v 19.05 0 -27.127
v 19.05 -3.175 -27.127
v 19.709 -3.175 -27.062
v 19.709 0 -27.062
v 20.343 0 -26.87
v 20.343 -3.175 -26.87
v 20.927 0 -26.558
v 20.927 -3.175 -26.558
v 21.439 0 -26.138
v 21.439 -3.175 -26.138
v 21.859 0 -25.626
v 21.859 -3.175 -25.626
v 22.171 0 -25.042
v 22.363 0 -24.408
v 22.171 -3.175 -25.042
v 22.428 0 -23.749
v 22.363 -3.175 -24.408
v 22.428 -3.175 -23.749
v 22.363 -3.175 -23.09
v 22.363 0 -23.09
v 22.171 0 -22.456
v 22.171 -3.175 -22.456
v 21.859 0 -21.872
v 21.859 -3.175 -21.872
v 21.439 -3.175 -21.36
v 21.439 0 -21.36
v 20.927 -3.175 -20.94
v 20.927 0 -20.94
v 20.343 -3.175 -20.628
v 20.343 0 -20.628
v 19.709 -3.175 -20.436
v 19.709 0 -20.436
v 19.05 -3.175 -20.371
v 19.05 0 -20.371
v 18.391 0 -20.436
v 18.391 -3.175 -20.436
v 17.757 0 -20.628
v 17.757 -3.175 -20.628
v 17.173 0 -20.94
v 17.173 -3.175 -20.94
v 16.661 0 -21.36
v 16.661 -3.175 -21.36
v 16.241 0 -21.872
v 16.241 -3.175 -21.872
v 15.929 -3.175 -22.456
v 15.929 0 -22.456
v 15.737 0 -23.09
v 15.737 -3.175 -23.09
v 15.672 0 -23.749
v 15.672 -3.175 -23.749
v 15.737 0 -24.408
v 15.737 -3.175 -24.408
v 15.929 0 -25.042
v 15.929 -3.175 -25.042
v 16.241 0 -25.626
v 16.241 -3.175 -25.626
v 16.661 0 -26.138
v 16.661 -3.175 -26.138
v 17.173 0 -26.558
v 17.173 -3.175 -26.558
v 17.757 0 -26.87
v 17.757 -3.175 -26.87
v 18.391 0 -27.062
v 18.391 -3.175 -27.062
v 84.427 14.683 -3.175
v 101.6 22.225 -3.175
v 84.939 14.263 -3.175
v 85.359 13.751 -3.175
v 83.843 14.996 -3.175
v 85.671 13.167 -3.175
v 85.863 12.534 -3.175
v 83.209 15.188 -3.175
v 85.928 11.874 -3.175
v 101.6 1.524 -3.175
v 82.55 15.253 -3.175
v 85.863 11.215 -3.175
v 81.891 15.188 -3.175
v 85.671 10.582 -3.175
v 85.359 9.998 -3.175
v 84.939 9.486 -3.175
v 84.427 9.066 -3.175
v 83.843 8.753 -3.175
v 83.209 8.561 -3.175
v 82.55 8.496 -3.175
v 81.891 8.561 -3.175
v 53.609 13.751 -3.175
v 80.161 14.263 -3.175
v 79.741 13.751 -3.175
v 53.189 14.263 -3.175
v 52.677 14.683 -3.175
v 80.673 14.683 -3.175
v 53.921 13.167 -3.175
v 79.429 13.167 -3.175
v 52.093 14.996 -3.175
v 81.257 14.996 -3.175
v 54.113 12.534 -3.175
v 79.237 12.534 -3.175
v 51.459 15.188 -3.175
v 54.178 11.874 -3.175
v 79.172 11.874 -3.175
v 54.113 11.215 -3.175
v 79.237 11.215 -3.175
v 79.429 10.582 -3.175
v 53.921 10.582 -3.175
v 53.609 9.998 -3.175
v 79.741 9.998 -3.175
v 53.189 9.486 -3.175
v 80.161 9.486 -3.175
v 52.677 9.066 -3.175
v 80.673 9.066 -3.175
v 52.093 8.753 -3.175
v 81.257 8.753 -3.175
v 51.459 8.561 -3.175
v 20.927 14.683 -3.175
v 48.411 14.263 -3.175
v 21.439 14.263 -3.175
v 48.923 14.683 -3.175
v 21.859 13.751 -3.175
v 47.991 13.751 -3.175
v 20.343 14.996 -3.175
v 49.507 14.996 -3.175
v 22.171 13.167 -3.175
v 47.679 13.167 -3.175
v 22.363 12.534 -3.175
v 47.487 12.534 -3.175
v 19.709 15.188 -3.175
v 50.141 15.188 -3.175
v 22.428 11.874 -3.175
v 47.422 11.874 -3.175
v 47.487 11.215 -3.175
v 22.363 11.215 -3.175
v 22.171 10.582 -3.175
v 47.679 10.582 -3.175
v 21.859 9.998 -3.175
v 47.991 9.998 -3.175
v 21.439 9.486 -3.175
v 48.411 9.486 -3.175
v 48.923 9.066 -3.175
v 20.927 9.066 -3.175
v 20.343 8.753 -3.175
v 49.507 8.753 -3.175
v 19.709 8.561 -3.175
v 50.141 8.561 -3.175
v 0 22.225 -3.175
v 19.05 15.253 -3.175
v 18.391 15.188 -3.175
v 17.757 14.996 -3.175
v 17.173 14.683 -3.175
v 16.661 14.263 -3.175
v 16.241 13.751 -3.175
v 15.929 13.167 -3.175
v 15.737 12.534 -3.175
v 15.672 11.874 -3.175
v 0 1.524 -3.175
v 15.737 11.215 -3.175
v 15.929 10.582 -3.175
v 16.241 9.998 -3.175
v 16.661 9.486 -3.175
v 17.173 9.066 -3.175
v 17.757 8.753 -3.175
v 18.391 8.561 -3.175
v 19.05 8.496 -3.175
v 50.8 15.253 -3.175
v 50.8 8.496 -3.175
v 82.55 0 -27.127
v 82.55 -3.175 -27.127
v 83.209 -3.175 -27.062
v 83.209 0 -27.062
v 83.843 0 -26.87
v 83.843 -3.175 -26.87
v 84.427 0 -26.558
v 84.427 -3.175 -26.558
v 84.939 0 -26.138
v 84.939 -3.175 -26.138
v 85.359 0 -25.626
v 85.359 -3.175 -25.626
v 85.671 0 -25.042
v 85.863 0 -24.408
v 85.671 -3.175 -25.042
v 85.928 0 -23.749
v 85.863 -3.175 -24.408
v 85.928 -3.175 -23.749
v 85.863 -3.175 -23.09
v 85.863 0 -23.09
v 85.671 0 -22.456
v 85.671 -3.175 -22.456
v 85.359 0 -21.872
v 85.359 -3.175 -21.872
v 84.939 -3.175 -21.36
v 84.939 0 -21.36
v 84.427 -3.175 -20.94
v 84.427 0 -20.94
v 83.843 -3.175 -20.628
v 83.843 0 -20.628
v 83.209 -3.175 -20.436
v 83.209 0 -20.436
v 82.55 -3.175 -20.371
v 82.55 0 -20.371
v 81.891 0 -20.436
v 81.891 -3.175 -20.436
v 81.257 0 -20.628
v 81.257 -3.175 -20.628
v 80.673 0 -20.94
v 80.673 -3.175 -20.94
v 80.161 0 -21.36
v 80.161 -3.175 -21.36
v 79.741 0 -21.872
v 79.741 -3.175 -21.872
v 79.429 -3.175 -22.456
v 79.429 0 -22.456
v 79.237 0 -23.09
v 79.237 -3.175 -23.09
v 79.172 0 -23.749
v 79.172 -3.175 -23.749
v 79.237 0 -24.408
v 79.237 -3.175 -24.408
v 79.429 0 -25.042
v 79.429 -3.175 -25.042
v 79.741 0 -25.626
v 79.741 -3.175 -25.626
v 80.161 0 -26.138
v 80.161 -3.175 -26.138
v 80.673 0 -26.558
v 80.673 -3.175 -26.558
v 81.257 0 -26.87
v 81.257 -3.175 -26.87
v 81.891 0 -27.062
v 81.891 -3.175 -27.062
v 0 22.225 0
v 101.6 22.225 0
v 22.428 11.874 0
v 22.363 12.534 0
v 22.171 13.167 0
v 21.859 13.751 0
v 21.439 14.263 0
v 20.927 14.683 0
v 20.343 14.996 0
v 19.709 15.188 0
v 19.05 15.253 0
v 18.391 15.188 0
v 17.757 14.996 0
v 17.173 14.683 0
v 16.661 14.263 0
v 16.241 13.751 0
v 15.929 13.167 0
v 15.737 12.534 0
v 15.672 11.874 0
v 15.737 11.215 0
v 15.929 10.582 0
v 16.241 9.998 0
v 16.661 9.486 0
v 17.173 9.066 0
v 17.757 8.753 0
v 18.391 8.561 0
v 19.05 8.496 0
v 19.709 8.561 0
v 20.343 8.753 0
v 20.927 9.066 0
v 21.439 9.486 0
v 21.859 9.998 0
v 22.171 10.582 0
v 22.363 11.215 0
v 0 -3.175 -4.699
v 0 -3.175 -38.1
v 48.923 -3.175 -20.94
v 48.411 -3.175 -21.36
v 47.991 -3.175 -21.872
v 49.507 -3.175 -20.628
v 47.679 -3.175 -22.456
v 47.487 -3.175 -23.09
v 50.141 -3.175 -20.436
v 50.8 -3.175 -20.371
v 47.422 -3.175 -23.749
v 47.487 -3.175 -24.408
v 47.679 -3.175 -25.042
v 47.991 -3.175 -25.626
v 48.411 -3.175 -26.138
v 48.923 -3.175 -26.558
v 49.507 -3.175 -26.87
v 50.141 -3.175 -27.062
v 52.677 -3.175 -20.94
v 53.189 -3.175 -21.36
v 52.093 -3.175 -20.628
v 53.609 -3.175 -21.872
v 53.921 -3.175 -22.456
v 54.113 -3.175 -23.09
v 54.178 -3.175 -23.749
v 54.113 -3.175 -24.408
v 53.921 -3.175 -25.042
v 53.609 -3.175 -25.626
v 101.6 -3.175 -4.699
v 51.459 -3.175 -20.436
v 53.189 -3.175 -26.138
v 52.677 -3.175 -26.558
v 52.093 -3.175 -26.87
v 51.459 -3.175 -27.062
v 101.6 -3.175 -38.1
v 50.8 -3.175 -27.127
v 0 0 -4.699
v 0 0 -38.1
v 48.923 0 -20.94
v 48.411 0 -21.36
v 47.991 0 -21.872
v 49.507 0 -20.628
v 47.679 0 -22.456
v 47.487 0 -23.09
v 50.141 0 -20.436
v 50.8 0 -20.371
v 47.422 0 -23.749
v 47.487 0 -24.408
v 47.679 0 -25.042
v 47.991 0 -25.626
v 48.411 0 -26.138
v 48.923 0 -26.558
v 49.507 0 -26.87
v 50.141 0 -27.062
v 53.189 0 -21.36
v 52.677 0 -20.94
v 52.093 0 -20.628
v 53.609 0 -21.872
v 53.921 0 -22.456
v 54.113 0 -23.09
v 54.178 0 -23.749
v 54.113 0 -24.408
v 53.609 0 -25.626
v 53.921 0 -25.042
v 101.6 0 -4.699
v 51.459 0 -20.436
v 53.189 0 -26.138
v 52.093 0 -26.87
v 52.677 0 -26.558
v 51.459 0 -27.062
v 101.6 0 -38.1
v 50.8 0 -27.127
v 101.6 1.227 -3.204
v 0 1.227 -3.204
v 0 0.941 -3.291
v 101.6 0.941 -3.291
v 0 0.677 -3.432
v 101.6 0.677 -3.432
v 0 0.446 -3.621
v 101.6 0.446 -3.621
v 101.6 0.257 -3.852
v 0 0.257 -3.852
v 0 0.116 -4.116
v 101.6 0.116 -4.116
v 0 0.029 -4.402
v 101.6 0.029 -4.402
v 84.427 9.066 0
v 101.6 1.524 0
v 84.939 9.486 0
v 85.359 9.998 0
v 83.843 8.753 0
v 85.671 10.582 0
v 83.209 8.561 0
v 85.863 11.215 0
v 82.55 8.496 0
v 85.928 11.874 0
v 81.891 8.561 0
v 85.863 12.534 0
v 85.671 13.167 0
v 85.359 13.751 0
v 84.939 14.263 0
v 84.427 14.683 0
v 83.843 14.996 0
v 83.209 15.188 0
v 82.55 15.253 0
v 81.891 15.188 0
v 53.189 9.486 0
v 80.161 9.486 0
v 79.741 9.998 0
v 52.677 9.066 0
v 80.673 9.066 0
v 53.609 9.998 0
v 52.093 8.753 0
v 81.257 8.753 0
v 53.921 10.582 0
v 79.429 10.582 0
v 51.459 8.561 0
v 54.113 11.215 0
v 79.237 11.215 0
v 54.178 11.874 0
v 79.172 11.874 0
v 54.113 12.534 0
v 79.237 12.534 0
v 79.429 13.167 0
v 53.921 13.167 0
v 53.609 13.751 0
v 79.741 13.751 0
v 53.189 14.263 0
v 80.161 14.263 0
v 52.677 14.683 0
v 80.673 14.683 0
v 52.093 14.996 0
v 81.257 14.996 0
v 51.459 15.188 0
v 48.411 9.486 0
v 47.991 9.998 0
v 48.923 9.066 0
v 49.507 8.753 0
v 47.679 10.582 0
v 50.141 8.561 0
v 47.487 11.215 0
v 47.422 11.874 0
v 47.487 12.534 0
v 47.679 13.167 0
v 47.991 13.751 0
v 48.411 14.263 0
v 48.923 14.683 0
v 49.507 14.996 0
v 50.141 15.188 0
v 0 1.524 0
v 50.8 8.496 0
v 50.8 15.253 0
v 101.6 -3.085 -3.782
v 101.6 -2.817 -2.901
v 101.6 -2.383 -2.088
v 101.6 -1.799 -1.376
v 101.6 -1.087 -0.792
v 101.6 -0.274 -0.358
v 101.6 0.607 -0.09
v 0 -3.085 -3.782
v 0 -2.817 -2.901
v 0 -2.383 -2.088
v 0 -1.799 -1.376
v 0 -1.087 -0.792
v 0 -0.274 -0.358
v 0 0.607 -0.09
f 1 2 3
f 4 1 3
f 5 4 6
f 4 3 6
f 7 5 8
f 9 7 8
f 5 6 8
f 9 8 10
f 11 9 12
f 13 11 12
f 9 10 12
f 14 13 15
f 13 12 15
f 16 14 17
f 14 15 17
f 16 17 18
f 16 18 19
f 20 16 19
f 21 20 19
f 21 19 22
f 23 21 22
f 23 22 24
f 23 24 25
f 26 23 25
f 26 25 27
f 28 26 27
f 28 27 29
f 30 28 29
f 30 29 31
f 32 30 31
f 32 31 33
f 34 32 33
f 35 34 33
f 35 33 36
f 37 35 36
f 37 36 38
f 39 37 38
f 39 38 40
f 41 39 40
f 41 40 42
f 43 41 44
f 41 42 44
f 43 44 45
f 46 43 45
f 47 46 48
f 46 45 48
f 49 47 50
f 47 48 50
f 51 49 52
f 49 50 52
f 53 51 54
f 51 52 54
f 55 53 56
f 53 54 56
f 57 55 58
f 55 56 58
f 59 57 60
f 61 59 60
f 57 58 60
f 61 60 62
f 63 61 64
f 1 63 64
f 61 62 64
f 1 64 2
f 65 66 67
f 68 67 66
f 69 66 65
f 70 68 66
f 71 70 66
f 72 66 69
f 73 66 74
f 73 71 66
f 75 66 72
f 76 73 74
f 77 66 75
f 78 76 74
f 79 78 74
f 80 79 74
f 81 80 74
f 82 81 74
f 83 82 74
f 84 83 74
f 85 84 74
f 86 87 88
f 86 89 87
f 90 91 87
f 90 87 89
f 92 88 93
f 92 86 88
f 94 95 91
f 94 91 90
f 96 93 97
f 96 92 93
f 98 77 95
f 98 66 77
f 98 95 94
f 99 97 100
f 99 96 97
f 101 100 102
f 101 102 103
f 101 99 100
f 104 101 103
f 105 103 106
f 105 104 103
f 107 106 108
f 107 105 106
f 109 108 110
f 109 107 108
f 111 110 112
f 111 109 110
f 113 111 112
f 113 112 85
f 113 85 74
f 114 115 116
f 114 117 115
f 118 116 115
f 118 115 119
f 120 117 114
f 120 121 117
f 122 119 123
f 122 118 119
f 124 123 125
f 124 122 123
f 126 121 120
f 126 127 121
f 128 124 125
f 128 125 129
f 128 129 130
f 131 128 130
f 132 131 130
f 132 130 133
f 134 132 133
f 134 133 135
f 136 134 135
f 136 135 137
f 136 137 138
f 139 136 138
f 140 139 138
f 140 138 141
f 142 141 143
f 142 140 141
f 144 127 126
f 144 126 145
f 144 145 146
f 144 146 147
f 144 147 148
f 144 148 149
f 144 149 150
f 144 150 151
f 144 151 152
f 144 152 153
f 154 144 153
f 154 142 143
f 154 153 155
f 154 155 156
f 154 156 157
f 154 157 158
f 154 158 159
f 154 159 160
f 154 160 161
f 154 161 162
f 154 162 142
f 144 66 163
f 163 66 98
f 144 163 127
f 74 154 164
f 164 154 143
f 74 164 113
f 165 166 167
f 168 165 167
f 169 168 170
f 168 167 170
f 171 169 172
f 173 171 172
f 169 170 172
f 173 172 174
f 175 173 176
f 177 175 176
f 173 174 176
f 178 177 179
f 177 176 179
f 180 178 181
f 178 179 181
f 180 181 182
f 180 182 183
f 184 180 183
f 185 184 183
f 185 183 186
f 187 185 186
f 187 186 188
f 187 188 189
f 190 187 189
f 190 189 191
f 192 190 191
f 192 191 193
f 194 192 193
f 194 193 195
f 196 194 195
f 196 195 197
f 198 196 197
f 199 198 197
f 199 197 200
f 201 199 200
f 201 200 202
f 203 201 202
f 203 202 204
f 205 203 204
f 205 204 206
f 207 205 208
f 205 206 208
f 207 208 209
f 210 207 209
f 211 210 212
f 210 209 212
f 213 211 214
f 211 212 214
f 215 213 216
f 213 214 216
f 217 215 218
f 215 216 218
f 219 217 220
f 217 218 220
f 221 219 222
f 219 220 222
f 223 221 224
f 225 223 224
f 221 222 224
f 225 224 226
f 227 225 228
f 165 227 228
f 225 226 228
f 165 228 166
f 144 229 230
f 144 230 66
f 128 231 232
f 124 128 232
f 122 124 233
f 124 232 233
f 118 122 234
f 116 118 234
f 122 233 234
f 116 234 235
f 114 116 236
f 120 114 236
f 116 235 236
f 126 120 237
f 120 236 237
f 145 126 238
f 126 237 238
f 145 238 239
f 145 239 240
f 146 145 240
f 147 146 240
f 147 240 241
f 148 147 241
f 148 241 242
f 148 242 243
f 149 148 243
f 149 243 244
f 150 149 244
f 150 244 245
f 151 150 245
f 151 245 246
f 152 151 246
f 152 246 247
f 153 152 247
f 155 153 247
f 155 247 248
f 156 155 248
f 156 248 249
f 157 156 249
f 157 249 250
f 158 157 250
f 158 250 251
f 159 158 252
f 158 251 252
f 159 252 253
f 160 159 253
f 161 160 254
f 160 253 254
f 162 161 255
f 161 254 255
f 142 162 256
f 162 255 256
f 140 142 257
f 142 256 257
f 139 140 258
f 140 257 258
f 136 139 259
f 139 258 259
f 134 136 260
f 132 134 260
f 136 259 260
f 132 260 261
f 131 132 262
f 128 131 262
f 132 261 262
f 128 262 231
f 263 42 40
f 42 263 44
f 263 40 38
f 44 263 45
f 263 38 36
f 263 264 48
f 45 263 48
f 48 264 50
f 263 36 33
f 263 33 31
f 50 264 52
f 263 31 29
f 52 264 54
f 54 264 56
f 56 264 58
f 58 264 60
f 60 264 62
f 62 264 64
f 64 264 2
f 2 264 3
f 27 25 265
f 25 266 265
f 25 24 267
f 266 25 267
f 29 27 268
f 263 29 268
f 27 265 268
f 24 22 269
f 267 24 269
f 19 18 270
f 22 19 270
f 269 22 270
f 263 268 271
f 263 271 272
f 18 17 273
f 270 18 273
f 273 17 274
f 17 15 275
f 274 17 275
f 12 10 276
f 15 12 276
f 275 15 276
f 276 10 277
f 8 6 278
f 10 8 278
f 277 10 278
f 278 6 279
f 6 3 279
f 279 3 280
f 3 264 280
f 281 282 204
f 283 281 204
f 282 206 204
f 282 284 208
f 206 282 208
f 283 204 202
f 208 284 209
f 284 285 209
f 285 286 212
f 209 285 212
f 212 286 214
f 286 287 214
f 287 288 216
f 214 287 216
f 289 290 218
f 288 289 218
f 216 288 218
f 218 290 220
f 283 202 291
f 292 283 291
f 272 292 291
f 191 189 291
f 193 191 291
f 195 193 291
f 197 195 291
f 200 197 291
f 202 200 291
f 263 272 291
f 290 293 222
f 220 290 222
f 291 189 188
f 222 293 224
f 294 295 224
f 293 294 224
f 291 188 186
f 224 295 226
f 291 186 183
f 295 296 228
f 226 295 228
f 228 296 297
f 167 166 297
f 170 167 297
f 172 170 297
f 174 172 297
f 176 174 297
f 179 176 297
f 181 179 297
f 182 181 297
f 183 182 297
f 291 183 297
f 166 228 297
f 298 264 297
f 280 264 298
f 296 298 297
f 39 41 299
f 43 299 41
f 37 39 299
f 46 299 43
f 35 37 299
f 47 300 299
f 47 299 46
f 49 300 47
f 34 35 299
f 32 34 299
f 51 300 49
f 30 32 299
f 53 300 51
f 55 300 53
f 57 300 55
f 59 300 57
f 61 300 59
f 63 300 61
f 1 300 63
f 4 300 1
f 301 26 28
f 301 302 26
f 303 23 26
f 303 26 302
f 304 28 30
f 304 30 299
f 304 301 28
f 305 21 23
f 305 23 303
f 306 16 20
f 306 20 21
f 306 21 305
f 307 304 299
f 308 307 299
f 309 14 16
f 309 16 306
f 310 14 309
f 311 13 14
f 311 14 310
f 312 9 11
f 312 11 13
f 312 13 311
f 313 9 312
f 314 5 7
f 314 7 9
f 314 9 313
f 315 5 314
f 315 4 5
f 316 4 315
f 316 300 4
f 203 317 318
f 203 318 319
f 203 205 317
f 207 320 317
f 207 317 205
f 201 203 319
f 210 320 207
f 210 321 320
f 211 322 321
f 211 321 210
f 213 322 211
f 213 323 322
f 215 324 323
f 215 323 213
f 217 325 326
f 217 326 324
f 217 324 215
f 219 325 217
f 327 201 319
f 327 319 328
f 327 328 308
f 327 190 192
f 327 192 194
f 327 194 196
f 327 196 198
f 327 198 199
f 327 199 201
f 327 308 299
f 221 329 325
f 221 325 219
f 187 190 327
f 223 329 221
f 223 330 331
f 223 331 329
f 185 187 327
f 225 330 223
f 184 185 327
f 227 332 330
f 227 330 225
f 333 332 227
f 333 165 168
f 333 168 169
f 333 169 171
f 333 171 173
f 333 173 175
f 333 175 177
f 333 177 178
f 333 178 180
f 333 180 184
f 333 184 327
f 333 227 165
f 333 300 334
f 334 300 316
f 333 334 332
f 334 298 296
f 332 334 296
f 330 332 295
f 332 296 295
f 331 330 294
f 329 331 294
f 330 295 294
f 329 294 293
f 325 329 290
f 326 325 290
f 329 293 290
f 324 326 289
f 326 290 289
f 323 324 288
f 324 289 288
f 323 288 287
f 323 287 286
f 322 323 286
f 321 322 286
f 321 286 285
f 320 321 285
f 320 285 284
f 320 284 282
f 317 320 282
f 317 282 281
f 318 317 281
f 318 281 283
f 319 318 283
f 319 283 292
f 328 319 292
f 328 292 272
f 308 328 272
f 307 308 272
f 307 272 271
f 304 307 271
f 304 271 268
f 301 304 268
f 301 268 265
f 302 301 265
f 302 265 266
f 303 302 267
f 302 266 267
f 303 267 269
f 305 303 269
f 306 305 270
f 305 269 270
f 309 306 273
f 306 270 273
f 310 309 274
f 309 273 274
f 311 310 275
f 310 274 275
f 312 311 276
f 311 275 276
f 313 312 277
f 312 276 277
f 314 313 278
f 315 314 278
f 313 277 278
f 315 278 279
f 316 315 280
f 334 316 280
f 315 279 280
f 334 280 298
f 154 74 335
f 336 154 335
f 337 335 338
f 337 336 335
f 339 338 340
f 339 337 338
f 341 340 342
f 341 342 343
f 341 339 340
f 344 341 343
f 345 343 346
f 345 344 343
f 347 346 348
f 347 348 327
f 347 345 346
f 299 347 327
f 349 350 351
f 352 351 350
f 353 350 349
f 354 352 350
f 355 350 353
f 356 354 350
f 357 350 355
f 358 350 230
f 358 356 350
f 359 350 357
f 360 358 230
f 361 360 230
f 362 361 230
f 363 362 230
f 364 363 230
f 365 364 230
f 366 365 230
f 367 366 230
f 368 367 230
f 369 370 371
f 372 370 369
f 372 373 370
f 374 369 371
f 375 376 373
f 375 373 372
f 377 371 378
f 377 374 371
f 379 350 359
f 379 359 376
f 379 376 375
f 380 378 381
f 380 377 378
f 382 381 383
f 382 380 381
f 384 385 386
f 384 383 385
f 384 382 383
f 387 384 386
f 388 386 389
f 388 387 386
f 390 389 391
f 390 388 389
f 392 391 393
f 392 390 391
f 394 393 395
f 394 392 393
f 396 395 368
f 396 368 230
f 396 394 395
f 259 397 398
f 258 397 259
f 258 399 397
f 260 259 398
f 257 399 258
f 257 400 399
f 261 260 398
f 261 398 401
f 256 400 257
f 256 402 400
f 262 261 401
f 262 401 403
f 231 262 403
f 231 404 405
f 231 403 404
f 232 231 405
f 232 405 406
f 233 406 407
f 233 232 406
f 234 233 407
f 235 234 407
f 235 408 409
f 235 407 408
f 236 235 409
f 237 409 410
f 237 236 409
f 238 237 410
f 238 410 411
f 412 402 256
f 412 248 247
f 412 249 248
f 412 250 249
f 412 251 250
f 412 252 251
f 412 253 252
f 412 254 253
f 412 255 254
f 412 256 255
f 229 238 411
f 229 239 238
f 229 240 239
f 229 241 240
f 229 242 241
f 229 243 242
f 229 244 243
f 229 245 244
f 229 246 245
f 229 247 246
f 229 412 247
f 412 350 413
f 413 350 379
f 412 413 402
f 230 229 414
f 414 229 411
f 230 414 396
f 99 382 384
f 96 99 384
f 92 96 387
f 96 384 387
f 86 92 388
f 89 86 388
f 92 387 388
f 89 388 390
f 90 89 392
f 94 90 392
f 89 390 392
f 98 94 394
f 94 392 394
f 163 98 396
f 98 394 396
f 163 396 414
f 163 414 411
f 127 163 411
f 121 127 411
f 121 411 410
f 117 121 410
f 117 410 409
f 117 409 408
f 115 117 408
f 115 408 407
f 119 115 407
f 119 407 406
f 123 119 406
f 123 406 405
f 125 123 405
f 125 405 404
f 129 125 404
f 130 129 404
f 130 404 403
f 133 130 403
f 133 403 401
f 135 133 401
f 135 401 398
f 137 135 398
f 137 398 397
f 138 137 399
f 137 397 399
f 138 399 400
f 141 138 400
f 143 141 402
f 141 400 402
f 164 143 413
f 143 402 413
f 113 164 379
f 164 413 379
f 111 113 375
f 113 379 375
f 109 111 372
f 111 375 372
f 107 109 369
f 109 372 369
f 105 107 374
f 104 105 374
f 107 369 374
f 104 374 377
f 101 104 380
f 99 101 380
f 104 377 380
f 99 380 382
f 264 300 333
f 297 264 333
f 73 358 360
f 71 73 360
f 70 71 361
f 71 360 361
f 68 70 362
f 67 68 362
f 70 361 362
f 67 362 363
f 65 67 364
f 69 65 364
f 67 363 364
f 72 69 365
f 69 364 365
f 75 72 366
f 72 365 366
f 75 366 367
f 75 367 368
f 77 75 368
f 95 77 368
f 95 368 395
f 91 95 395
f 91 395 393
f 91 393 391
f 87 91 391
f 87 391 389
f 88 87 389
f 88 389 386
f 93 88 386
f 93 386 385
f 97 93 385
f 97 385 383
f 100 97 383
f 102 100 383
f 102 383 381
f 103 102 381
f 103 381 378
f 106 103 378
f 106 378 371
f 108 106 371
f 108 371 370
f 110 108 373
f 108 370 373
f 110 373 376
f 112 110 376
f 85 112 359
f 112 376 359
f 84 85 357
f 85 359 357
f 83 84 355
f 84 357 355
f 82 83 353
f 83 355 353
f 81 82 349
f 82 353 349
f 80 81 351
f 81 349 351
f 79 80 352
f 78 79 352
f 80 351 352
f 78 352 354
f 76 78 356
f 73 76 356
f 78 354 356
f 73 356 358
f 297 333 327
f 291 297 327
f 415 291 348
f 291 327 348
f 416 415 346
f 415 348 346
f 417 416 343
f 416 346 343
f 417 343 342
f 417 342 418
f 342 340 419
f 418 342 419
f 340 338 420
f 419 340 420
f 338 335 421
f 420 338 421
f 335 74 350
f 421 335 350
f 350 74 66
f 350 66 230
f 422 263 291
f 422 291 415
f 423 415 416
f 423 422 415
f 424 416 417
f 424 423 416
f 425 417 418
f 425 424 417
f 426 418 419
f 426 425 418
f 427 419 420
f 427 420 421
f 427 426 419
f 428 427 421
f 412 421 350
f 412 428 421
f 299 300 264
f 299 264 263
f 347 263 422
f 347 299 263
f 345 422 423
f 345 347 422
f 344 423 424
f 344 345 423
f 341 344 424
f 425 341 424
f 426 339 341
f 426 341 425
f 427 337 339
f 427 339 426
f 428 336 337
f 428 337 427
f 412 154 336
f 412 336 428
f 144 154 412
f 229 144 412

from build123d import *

# Parameters (mm, degrees)
SKETCH1_W                         = 101.6
SKETCH1_H                         = 38.1
BASE_FLANGE1_DEPTH                = 3.175
EDGE_FLANGE1_STRIP_W              = 15.748
EDGE_FLANGE1_STRIP_H              = 3.175
EDGE_FLANGE1_STRIP_CUT_DEPTH      = 101.6
EDGE_FLANGE1_DEPTH                = 101.6
F_1_4_CLEARANCE_HOLE1_D           = 6.7564
F_1_4_CLEARANCE_HOLE1_ON_FACE_2_D = 6.7564


# Sheet-metal steps are written as plain solids
with BuildPart() as part:
    # Sketch1 → Base-Flange1 (new body)
    with BuildSketch(Plane(origin=(0, 0, 0), x_dir=(1, 0, 0), z_dir=(0, 1, 0))):
        with Locations((50.8, 19.05)):
            Rectangle(SKETCH1_W, SKETCH1_H)
    extrude(amount=-BASE_FLANGE1_DEPTH)

    # Edge-Flange1 strip (across the edge) → Edge-Flange1 strip cut (cut)
    with BuildSketch(Plane(origin=(0, 0, 0), x_dir=(0, 0, -1), z_dir=(1, 0, 0))):
        with Locations((-3.175, -1.5875)):
            Rectangle(EDGE_FLANGE1_STRIP_W, EDGE_FLANGE1_STRIP_H)
    extrude(amount=EDGE_FLANGE1_STRIP_CUT_DEPTH, mode=Mode.SUBTRACT)

    # Edge-Flange1 section (across the edge) → Edge-Flange1 (add)
    with BuildSketch(Plane(origin=(0, 0, 0), x_dir=(0, 0, -1), z_dir=(1, 0, 0))):
        with BuildLine():
            Line((0, 1.524), (0, 22.225))
            Line((0, 22.225), (3.175, 22.225))
            Line((3.175, 22.225), (3.175, 1.524))
            ThreePointArc((3.175, 1.524), (3.621369265, 0.446369265), (4.699, 0))
            Line((4.699, 0), (4.699, -3.175))
            ThreePointArc((4.699, -3.175), (1.376305235, -1.798694765), (0, 1.524))
        make_face()
    extrude(amount=EDGE_FLANGE1_DEPTH)

    # 1/4 Clearance Hole1 (through all)
    with Locations(Plane(origin=(19.05, 0, -23.749), x_dir=(0, 0, 1), z_dir=(0, 1, 0))):
        with Locations((0, 0), (0, 31.75), (0, 63.5)):
            Hole(F_1_4_CLEARANCE_HOLE1_D / 2)

    # 1/4 Clearance Hole1 on face 2 (through all)
    with Locations(Plane(origin=(19.05, 11.8745, -3.175), x_dir=(-1, 0, 0), z_dir=(0, 0, -1))):
        with Locations((0, 0), (-31.75, 0), (-63.5, 0)):
            Hole(F_1_4_CLEARANCE_HOLE1_ON_FACE_2_D / 2)


solid = part.part
